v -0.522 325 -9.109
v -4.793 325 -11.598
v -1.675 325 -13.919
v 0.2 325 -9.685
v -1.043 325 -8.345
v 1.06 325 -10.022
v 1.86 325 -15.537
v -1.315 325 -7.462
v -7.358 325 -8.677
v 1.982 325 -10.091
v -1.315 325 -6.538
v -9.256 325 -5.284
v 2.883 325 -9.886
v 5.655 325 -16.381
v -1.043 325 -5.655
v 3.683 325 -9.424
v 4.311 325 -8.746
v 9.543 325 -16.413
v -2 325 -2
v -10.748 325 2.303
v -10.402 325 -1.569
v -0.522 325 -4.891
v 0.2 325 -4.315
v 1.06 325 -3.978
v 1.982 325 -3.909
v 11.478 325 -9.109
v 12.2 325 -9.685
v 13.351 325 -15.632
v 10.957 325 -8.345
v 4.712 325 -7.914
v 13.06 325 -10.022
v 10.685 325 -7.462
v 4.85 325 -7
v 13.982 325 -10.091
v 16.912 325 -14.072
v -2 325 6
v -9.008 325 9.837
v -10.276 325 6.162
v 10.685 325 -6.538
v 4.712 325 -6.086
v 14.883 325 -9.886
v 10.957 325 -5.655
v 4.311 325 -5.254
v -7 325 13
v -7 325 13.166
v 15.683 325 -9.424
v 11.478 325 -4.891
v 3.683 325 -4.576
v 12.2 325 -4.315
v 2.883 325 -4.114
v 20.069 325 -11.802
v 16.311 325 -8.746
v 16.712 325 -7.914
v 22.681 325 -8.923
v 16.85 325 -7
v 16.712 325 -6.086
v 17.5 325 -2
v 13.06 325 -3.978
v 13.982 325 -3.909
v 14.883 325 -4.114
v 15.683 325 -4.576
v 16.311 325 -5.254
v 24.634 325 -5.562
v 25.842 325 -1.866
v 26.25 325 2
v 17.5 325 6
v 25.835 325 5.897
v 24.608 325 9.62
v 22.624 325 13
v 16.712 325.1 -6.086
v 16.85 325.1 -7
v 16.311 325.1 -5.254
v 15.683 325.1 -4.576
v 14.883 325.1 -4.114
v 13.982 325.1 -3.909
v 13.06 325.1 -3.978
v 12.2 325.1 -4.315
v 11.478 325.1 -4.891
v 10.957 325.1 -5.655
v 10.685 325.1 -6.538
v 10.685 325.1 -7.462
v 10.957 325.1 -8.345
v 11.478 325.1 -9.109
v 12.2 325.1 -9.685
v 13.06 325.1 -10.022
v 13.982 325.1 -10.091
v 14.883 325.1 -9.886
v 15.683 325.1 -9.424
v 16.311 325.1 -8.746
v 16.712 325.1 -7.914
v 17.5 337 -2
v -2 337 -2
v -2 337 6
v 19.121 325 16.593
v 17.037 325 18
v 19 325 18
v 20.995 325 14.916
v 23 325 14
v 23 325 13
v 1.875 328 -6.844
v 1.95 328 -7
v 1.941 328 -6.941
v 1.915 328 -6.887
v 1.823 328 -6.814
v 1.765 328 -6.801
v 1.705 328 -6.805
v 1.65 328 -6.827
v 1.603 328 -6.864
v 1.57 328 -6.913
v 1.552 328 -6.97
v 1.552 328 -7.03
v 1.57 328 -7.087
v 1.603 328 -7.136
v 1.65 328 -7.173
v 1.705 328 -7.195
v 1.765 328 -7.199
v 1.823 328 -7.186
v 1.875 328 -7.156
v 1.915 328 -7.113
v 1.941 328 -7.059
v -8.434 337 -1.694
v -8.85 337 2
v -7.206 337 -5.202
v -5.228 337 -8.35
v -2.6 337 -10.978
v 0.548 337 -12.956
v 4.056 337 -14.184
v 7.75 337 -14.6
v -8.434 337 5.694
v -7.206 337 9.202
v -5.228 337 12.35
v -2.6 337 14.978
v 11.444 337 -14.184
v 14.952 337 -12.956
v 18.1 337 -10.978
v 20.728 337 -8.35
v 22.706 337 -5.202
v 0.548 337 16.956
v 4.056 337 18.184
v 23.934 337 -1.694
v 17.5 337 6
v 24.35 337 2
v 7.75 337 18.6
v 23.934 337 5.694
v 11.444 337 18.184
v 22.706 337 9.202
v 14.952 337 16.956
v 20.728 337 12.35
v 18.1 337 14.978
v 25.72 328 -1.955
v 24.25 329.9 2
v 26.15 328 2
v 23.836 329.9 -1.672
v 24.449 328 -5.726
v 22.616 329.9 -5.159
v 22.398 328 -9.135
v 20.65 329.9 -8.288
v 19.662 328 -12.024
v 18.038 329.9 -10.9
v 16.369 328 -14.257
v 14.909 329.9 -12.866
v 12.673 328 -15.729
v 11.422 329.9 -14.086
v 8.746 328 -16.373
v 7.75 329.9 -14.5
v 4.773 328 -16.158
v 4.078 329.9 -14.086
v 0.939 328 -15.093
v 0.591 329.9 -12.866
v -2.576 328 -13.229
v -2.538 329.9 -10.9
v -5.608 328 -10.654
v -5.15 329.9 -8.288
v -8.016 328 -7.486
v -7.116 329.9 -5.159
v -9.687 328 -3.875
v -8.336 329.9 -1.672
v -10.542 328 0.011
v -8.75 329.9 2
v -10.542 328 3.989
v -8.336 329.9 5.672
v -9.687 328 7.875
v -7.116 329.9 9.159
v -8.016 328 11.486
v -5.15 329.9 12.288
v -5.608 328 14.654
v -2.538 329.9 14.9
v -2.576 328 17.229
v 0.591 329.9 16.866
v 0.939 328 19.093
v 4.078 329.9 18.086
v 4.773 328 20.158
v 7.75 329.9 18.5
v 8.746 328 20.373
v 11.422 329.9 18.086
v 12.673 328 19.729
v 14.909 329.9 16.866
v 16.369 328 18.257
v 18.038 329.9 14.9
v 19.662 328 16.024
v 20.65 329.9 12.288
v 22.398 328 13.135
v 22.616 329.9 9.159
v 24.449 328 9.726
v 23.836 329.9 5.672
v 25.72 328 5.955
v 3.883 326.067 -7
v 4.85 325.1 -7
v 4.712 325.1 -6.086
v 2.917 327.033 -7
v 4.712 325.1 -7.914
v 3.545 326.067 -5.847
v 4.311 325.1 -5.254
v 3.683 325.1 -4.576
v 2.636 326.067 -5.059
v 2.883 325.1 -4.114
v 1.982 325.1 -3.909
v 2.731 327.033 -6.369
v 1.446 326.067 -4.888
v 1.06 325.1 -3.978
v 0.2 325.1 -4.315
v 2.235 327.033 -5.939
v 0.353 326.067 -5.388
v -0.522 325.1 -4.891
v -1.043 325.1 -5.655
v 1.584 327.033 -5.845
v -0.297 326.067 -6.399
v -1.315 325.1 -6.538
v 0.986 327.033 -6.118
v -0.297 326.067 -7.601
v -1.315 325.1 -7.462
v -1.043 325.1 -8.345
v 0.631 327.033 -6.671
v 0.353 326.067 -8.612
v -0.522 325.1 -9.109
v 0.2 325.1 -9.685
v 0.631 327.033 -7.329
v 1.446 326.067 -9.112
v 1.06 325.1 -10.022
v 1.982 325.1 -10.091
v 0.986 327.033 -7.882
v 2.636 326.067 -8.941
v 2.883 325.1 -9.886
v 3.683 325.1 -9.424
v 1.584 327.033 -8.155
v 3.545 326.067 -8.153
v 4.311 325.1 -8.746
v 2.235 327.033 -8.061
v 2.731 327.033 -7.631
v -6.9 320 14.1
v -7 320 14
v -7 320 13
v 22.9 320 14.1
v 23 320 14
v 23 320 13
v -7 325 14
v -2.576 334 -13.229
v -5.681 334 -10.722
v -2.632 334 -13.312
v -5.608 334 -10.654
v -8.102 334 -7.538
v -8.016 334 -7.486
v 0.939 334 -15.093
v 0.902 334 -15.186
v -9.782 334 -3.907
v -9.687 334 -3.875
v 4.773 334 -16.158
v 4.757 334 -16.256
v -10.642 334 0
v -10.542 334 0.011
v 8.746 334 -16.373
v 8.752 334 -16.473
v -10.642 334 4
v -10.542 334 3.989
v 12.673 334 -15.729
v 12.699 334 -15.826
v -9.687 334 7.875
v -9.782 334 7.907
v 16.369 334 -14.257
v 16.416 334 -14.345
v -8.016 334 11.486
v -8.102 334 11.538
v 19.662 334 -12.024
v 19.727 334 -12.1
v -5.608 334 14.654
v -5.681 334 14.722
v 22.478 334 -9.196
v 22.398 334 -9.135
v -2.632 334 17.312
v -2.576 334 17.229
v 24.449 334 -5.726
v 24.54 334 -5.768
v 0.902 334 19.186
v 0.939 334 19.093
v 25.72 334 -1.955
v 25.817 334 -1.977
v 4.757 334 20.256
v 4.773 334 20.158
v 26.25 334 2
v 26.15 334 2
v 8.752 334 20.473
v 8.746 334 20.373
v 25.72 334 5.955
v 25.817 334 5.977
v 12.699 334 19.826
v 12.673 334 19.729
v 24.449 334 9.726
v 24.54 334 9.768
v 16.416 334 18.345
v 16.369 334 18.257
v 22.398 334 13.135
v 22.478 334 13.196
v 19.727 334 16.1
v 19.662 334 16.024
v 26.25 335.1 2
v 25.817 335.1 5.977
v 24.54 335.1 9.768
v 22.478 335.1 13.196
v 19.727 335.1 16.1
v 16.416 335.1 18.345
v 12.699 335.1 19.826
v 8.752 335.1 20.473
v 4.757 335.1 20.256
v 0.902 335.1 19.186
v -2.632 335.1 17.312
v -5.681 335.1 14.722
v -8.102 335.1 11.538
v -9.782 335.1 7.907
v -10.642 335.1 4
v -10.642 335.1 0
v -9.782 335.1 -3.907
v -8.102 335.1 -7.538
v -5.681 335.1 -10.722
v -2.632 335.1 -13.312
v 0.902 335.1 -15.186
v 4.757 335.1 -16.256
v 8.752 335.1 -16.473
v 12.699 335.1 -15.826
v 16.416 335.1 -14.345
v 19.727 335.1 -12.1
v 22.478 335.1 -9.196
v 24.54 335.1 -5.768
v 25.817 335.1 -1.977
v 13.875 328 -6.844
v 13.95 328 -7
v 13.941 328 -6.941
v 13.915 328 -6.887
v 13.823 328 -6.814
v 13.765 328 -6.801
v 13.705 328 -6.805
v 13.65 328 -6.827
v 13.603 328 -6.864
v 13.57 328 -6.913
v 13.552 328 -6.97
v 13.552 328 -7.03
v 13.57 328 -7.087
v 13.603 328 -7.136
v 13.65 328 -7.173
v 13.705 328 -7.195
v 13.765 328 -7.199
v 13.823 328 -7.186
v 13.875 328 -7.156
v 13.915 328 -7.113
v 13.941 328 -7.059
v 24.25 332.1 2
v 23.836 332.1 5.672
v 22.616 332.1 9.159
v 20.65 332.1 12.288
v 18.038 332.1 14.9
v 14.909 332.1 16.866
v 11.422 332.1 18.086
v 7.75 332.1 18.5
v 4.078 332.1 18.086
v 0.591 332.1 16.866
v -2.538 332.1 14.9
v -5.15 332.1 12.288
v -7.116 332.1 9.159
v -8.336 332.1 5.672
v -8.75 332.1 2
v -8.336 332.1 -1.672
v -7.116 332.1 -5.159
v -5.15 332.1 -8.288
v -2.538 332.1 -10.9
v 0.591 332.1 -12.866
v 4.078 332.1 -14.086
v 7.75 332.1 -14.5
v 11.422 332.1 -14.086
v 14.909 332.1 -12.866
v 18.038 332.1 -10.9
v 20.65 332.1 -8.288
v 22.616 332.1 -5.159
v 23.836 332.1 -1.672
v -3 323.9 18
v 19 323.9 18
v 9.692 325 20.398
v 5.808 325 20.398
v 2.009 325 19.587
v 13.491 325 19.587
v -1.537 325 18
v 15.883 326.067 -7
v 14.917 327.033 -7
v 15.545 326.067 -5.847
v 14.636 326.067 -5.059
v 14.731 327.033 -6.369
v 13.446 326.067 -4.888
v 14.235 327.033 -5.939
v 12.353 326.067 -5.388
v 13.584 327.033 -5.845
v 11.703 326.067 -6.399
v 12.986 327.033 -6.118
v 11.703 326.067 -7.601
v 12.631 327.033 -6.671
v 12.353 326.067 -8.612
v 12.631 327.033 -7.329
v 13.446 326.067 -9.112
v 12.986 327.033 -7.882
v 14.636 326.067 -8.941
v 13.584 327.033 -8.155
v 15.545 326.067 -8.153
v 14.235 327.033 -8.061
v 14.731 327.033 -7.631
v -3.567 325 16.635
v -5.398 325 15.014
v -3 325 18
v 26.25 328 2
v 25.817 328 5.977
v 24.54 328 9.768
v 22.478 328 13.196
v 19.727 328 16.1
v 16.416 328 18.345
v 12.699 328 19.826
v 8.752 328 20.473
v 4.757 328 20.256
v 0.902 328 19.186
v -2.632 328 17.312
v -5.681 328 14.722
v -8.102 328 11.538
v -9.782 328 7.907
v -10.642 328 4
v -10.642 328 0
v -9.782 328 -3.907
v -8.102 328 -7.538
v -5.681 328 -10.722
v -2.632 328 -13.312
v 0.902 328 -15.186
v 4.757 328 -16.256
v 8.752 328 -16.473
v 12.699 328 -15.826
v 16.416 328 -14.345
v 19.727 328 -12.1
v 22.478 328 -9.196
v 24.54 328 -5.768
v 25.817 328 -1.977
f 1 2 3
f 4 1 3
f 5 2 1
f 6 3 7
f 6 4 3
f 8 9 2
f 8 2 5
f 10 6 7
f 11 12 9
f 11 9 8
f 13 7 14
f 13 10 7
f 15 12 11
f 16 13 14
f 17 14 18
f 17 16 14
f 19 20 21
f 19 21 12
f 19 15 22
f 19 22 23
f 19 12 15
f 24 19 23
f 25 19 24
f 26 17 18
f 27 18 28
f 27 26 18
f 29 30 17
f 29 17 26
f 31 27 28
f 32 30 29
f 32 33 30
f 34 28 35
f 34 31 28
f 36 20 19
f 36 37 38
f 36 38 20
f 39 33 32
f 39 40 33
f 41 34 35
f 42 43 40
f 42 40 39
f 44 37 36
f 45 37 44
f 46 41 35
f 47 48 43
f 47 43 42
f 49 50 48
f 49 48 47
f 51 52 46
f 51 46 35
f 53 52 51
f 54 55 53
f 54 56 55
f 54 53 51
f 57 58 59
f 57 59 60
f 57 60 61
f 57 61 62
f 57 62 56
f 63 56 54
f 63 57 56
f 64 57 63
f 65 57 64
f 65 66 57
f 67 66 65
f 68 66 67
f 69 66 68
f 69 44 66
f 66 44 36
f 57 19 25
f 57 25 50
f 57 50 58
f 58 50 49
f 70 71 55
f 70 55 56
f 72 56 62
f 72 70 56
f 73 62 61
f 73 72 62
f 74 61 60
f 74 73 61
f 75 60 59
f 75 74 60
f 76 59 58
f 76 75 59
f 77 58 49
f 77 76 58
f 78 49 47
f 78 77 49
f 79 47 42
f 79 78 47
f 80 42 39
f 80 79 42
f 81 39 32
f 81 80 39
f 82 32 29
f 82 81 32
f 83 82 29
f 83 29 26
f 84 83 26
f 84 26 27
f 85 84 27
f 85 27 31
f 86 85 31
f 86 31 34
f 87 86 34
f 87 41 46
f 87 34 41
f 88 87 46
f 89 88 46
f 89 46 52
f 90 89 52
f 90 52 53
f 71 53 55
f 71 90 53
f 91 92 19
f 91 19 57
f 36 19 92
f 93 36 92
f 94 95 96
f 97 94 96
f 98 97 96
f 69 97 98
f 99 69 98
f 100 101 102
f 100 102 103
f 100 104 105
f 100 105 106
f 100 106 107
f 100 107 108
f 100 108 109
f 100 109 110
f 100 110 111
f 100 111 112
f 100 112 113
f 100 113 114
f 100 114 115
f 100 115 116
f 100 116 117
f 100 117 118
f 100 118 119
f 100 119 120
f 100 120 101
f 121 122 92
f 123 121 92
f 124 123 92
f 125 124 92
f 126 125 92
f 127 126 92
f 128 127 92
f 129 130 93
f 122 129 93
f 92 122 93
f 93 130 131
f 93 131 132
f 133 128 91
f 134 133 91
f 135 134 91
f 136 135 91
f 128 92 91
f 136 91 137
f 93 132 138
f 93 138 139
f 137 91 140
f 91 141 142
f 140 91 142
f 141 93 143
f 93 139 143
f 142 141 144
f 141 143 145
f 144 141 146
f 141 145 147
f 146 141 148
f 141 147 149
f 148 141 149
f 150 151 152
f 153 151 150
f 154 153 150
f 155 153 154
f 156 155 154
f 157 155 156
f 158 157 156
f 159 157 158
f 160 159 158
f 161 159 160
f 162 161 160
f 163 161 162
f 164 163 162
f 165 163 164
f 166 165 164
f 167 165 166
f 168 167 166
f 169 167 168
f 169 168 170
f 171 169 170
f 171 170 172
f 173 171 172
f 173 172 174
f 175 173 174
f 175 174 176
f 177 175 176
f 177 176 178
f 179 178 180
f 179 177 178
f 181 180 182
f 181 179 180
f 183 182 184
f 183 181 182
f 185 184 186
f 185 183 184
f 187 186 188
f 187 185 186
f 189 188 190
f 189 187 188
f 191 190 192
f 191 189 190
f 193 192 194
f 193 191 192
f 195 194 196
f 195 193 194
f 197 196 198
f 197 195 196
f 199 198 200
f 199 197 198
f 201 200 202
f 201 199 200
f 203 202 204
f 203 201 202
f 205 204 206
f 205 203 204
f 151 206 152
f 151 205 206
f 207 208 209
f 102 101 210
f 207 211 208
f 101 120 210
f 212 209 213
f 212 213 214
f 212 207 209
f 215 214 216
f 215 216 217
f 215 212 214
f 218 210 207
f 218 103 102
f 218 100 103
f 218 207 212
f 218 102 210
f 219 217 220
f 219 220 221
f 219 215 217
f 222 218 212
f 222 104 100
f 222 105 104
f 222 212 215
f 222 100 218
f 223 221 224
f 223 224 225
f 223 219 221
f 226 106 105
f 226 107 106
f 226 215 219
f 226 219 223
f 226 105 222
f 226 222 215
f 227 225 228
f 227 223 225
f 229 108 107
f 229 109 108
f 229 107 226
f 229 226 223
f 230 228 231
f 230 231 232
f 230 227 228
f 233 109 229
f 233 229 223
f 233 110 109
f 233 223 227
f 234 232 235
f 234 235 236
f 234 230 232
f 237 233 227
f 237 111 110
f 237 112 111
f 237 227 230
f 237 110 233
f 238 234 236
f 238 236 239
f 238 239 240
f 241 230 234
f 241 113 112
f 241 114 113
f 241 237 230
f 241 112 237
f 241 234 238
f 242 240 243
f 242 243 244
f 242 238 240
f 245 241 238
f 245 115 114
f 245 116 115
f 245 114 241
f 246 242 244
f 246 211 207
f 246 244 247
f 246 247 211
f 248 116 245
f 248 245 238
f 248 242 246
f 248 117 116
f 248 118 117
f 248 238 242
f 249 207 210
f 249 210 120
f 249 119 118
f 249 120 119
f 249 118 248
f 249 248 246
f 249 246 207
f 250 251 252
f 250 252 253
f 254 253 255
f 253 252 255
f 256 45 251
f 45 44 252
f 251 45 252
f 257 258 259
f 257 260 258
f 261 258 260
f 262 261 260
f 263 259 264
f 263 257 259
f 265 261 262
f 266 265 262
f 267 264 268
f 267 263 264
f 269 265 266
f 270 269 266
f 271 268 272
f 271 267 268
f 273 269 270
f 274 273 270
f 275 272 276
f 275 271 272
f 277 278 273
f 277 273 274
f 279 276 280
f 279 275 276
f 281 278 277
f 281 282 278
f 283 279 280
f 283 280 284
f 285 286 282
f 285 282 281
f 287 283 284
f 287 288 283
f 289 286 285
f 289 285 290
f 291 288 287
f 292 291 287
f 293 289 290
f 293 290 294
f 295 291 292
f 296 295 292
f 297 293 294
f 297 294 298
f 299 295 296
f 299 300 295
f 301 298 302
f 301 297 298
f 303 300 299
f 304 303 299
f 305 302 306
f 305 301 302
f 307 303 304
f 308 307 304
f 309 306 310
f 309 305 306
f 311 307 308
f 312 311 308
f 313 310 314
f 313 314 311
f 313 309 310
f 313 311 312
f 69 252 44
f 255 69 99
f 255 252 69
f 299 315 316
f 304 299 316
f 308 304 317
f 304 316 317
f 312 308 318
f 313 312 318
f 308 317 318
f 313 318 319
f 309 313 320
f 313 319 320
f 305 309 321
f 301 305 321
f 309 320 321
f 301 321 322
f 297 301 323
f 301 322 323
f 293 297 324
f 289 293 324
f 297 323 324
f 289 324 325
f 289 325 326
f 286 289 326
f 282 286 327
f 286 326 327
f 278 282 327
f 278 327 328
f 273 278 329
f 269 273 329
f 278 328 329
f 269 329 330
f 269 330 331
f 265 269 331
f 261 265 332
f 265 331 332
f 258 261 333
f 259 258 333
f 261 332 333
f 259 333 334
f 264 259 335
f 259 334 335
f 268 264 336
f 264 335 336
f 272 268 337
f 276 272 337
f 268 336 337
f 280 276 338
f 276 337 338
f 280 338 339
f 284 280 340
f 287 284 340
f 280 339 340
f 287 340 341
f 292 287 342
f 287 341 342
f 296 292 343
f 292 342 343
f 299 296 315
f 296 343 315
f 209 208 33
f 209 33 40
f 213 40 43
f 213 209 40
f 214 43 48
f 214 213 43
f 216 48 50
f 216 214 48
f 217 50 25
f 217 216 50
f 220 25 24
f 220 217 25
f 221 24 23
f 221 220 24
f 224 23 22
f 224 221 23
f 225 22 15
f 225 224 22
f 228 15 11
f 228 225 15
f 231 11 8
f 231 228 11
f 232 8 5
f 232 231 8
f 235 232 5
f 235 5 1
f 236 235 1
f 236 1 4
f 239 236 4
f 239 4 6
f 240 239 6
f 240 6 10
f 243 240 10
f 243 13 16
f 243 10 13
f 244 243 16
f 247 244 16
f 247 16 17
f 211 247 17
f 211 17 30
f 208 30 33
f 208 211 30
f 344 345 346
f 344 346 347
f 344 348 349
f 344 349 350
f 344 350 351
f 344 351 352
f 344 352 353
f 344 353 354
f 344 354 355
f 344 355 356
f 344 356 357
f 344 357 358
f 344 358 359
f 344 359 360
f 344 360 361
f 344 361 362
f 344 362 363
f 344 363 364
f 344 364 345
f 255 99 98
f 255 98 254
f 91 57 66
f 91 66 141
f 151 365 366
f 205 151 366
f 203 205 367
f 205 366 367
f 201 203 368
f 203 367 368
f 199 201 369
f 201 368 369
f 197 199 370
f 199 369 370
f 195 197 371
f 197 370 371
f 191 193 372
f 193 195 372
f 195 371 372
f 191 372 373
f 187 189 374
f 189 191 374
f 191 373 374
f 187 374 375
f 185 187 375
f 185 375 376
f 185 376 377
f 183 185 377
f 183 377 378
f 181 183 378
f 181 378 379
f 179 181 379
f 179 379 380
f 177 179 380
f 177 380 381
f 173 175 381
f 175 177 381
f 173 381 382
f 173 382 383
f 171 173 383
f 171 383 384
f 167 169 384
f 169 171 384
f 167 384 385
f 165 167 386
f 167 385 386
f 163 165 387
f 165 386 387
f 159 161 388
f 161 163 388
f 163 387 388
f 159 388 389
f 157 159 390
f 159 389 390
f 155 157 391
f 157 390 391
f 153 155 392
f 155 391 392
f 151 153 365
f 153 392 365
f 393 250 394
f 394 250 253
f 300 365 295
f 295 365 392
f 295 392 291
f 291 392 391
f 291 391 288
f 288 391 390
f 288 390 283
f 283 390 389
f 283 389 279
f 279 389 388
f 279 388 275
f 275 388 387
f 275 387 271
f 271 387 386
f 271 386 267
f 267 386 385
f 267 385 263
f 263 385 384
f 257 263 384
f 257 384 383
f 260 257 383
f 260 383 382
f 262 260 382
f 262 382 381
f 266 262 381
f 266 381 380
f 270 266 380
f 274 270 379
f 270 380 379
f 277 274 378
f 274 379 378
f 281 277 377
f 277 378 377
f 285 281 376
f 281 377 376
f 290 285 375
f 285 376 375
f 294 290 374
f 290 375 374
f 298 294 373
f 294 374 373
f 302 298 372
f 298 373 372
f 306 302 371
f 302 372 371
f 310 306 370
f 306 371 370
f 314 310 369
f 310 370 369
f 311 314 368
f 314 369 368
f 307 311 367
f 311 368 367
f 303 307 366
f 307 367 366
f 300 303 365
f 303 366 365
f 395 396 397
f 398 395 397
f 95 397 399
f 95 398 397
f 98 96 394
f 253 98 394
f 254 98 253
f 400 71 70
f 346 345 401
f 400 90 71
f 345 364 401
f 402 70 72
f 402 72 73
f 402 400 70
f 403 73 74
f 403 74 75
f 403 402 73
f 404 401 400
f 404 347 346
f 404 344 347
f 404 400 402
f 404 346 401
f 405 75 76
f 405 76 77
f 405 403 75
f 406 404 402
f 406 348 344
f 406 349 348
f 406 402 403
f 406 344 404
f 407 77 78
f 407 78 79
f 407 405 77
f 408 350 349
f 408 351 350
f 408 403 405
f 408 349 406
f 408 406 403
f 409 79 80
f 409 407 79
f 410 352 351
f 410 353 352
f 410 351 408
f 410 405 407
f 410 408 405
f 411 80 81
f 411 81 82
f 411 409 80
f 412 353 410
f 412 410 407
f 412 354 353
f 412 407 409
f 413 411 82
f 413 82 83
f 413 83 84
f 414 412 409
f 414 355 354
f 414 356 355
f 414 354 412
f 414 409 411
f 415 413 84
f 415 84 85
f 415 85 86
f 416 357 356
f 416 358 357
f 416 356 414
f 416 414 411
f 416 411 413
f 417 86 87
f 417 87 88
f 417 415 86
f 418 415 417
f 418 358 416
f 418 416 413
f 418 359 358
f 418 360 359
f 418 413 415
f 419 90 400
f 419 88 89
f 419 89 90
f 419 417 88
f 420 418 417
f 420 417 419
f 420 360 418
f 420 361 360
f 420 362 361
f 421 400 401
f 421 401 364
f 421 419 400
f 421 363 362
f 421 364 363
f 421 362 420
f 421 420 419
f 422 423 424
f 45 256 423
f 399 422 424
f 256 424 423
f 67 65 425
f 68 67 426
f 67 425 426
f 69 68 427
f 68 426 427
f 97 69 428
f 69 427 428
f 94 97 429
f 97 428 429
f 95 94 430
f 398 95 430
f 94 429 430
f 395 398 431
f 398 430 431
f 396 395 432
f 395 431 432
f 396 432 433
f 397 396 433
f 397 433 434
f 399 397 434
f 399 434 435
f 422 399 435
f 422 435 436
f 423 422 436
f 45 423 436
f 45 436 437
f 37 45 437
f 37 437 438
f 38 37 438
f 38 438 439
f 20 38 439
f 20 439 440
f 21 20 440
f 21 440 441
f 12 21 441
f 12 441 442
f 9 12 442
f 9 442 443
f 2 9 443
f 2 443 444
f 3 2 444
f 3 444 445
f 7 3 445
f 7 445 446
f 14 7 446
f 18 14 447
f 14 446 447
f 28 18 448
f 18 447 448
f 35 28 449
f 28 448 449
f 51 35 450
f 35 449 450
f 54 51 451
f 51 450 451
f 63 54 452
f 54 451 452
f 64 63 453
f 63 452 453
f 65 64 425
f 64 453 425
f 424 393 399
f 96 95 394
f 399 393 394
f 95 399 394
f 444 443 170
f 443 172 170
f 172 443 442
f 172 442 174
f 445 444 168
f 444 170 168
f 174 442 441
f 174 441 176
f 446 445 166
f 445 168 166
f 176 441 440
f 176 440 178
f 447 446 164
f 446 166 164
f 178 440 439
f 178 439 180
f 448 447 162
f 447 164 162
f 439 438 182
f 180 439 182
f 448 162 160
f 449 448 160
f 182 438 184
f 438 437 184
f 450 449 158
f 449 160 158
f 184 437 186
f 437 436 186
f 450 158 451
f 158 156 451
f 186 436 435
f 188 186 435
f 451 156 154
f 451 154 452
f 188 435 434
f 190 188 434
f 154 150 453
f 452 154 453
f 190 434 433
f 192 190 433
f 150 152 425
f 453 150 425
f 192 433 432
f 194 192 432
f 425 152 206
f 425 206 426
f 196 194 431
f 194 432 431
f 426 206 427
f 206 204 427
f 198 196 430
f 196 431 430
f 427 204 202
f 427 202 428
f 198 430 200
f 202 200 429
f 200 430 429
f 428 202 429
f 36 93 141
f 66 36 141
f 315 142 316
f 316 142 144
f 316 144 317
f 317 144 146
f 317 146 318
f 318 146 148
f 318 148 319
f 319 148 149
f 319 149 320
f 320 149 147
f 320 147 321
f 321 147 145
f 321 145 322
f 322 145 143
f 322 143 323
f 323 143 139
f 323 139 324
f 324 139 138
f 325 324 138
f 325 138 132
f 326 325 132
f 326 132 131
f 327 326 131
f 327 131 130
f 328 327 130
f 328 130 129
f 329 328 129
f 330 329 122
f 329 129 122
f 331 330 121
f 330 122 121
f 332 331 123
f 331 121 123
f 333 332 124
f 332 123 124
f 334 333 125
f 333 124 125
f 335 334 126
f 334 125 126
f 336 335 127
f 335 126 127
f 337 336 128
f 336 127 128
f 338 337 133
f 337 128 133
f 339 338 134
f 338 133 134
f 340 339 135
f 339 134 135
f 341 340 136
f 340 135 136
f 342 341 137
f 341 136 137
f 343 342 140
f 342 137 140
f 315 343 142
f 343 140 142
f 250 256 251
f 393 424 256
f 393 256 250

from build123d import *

# Parameters (mm, degrees)
BOX005009014_W         = 30
BOX005009014_H         = 5
BOX005009014_DEPTH     = 5
CHAMFER016_SIZE        = 4
CHAMFER017_SIZE        = 4
CHAMFER019_SIZE        = 3.9
BOX005009012_W         = 19.5
BOX005009012_H         = 400
BOX005009012_DEPTH     = 8
CYLINDER023_R          = 3.1
CYLINDER023_DEPTH      = 6
CYLINDER023_ROLL_ANGLE = 90
CHAMFER011_SIZE        = 2.9
CHAMFER009_SIZE        = 2.9
CYLINDER018_R          = 18.5
CYLINDER018_DEPTH      = 3
CYLINDER018_ROLL_ANGLE = 90
CYLINDER017_R          = 16.5
CYLINDER017_DEPTH      = 10
CYLINDER017_ROLL_ANGLE = 90
CYLINDER016_R          = 18.5
CYLINDER016_DEPTH      = 3
CYLINDER016_ROLL_ANGLE = 90
CHAMFER023_SIZE        = 1.9
CHAMFER024_SIZE        = 1.9
CHAMFER025_SIZE        = 1.9


with BuildPart() as chamfer019:
    # Box005009014 → Box005009014 (new body)
    with BuildSketch(Plane(origin=(-7, 261, 13), x_dir=(1, 0, 0), z_dir=(0, 0, 1))):
        with Locations((15, 2.5)):
            Rectangle(BOX005009014_W, BOX005009014_H)
    extrude(amount=BOX005009014_DEPTH)

    # Chamfer016
    chamfer016_edges = [chamfer019.edges().sort_by_distance(p)[0] for p in [
        (-7, 263.5, 18),
    ]]
    chamfer(chamfer016_edges, length=CHAMFER016_SIZE)

    # Chamfer017
    chamfer017_edges = [chamfer019.edges().sort_by_distance(p)[0] for p in [
        (23, 263.5, 18),
    ]]
    chamfer(chamfer017_edges, length=CHAMFER017_SIZE)

    # Chamfer019
    chamfer019_edges = [chamfer019.edges().sort_by_distance(p)[0] for p in [
        (8, 266, 18),
    ]]
    chamfer(chamfer019_edges, length=CHAMFER019_SIZE)


with BuildPart() as part_mirroring005:
    # Part__Mirroring005: instance of Chamfer019
    add(chamfer019.part.mirror(Plane(origin=(0, 250, 0), x_dir=(1, 0, 0), z_dir=(0, 1, 0))))


with BuildPart() as part_mirroring005_1:
    # Part__Mirroring005 placement: moved
    add(part_mirroring005.part.moved(Location((0, 86, 0))))


with BuildPart() as scale_hole001:
    # Box005009012 → Box005009012 (new body)
    with BuildSketch(Plane(origin=(-2, 0, -2), x_dir=(1, 0, 0), z_dir=(0, 0, 1))):
        with Locations((9.75, 200)):
            Rectangle(BOX005009012_W, BOX005009012_H)
    extrude(amount=BOX005009012_DEPTH)


with BuildPart() as lug_hole:
    # Cylinder023 → Cylinder023 (new body)
    with BuildSketch(Plane.XY):
        Circle(CYLINDER023_R)
    extrude(amount=CYLINDER023_DEPTH)


with BuildPart() as lug_hole_1:
    # Cylinder023 roll: moved
    add(lug_hole.part.rotate(Axis((0, 0, 0), (1, 0, 0)), CYLINDER023_ROLL_ANGLE))


with BuildPart() as lug_hole_2:
    # Cylinder023 placement: moved
    add(lug_hole_1.part.moved(Location((7.75, 328, -7))))


with BuildPart() as chamfer011:
    # Chamfer011 base: copy of lug-hole
    add(lug_hole_2.part)

    # Chamfer011
    chamfer011_edges = [chamfer011.edges().sort_by_distance(p)[0] for p in [
        (4.65, 328, -7),
    ]]
    chamfer(chamfer011_edges, length=CHAMFER011_SIZE)


with BuildPart() as chamfer011_1:
    # Chamfer011 placement: moved
    add(chamfer011.part.moved(Location((6, 0, 0))))


with BuildPart() as lug_holes:
    # Chamfer009 base: copy of lug-hole
    add(lug_hole_2.part)

    # Chamfer009
    chamfer009_edges = [lug_holes.edges().sort_by_distance(p)[0] for p in [
        (4.65, 328, -7),
    ]]
    chamfer(chamfer009_edges, length=CHAMFER009_SIZE)


with BuildPart() as lug_holes_1:
    # Chamfer009 placement: moved
    add(lug_holes.part.moved(Location((-6, 0, 0))))

    # Fusion013: union Chamfer011
    add(chamfer011_1.part)


with BuildPart() as end_cheek001:
    # Cylinder018 → Cylinder018 (new body)
    with BuildSketch(Plane.XY):
        Circle(CYLINDER018_R)
    extrude(amount=CYLINDER018_DEPTH)


with BuildPart() as end_cheek001_1:
    # Cylinder018 roll: moved
    add(end_cheek001.part.rotate(Axis((0, 0, 0), (1, 0, 0)), CYLINDER018_ROLL_ANGLE))


with BuildPart() as end_cheek001_2:
    # Cylinder018 placement: moved
    add(end_cheek001_1.part.moved(Location((7.75, 486, 2))))


with BuildPart() as cable_tie_cyl001:
    # Cylinder017 → Cylinder017 (new body)
    with BuildSketch(Plane.XY):
        Circle(CYLINDER017_R)
    extrude(amount=CYLINDER017_DEPTH)


with BuildPart() as cable_tie_cyl001_1:
    # Cylinder017 roll: moved
    add(cable_tie_cyl001.part.rotate(Axis((0, 0, 0), (1, 0, 0)), CYLINDER017_ROLL_ANGLE))


with BuildPart() as cable_tie_cyl001_2:
    # Cylinder017 placement: moved
    add(cable_tie_cyl001_1.part.moved(Location((7.75, 485, 2))))


with BuildPart() as slider_end_l:
    # Cylinder016 → Cylinder016 (new body)
    with BuildSketch(Plane.XY):
        Circle(CYLINDER016_R)
    extrude(amount=CYLINDER016_DEPTH)


with BuildPart() as slider_end_l_1:
    # Cylinder016 roll: moved
    add(slider_end_l.part.rotate(Axis((0, 0, 0), (1, 0, 0)), CYLINDER016_ROLL_ANGLE))


with BuildPart() as slider_end_l_2:
    # Cylinder016 placement: moved
    add(slider_end_l_1.part.moved(Location((7.75, 477, 2))))

    # Fusion010: union end-cheek001, cable-tie-cyl001
    add(end_cheek001_2.part)
    add(cable_tie_cyl001_2.part)


with BuildPart() as slider_end_l_3:
    # Fusion010 placement: moved
    add(slider_end_l_2.part.moved(Location((0, -149, 0))))

    # Cut016: cut lug-holes
    add(lug_holes_1.part, mode=Mode.SUBTRACT)

    # Cut019: cut scale-hole001
    add(scale_hole001.part, mode=Mode.SUBTRACT)

    # Fusion021: union Part__Mirroring005
    add(part_mirroring005_1.part)

    # Chamfer023
    chamfer023_edges = [slider_end_l_3.edges().sort_by_distance(p)[0] for p in [
        (-8.75, 328, 2),
    ]]
    chamfer(chamfer023_edges, length=CHAMFER023_SIZE)

    # Chamfer024
    chamfer024_edges = [slider_end_l_3.edges().sort_by_distance(p)[0] for p in [
        (-10.75, 337, 2),
    ]]
    chamfer(chamfer024_edges, length=CHAMFER024_SIZE)

    # Chamfer025
    chamfer025_edges = [slider_end_l_3.edges().sort_by_distance(p)[0] for p in [
        (-8.75, 334, 2),
    ]]
    chamfer(chamfer025_edges, length=CHAMFER025_SIZE)


solid = slider_end_l_3.part
